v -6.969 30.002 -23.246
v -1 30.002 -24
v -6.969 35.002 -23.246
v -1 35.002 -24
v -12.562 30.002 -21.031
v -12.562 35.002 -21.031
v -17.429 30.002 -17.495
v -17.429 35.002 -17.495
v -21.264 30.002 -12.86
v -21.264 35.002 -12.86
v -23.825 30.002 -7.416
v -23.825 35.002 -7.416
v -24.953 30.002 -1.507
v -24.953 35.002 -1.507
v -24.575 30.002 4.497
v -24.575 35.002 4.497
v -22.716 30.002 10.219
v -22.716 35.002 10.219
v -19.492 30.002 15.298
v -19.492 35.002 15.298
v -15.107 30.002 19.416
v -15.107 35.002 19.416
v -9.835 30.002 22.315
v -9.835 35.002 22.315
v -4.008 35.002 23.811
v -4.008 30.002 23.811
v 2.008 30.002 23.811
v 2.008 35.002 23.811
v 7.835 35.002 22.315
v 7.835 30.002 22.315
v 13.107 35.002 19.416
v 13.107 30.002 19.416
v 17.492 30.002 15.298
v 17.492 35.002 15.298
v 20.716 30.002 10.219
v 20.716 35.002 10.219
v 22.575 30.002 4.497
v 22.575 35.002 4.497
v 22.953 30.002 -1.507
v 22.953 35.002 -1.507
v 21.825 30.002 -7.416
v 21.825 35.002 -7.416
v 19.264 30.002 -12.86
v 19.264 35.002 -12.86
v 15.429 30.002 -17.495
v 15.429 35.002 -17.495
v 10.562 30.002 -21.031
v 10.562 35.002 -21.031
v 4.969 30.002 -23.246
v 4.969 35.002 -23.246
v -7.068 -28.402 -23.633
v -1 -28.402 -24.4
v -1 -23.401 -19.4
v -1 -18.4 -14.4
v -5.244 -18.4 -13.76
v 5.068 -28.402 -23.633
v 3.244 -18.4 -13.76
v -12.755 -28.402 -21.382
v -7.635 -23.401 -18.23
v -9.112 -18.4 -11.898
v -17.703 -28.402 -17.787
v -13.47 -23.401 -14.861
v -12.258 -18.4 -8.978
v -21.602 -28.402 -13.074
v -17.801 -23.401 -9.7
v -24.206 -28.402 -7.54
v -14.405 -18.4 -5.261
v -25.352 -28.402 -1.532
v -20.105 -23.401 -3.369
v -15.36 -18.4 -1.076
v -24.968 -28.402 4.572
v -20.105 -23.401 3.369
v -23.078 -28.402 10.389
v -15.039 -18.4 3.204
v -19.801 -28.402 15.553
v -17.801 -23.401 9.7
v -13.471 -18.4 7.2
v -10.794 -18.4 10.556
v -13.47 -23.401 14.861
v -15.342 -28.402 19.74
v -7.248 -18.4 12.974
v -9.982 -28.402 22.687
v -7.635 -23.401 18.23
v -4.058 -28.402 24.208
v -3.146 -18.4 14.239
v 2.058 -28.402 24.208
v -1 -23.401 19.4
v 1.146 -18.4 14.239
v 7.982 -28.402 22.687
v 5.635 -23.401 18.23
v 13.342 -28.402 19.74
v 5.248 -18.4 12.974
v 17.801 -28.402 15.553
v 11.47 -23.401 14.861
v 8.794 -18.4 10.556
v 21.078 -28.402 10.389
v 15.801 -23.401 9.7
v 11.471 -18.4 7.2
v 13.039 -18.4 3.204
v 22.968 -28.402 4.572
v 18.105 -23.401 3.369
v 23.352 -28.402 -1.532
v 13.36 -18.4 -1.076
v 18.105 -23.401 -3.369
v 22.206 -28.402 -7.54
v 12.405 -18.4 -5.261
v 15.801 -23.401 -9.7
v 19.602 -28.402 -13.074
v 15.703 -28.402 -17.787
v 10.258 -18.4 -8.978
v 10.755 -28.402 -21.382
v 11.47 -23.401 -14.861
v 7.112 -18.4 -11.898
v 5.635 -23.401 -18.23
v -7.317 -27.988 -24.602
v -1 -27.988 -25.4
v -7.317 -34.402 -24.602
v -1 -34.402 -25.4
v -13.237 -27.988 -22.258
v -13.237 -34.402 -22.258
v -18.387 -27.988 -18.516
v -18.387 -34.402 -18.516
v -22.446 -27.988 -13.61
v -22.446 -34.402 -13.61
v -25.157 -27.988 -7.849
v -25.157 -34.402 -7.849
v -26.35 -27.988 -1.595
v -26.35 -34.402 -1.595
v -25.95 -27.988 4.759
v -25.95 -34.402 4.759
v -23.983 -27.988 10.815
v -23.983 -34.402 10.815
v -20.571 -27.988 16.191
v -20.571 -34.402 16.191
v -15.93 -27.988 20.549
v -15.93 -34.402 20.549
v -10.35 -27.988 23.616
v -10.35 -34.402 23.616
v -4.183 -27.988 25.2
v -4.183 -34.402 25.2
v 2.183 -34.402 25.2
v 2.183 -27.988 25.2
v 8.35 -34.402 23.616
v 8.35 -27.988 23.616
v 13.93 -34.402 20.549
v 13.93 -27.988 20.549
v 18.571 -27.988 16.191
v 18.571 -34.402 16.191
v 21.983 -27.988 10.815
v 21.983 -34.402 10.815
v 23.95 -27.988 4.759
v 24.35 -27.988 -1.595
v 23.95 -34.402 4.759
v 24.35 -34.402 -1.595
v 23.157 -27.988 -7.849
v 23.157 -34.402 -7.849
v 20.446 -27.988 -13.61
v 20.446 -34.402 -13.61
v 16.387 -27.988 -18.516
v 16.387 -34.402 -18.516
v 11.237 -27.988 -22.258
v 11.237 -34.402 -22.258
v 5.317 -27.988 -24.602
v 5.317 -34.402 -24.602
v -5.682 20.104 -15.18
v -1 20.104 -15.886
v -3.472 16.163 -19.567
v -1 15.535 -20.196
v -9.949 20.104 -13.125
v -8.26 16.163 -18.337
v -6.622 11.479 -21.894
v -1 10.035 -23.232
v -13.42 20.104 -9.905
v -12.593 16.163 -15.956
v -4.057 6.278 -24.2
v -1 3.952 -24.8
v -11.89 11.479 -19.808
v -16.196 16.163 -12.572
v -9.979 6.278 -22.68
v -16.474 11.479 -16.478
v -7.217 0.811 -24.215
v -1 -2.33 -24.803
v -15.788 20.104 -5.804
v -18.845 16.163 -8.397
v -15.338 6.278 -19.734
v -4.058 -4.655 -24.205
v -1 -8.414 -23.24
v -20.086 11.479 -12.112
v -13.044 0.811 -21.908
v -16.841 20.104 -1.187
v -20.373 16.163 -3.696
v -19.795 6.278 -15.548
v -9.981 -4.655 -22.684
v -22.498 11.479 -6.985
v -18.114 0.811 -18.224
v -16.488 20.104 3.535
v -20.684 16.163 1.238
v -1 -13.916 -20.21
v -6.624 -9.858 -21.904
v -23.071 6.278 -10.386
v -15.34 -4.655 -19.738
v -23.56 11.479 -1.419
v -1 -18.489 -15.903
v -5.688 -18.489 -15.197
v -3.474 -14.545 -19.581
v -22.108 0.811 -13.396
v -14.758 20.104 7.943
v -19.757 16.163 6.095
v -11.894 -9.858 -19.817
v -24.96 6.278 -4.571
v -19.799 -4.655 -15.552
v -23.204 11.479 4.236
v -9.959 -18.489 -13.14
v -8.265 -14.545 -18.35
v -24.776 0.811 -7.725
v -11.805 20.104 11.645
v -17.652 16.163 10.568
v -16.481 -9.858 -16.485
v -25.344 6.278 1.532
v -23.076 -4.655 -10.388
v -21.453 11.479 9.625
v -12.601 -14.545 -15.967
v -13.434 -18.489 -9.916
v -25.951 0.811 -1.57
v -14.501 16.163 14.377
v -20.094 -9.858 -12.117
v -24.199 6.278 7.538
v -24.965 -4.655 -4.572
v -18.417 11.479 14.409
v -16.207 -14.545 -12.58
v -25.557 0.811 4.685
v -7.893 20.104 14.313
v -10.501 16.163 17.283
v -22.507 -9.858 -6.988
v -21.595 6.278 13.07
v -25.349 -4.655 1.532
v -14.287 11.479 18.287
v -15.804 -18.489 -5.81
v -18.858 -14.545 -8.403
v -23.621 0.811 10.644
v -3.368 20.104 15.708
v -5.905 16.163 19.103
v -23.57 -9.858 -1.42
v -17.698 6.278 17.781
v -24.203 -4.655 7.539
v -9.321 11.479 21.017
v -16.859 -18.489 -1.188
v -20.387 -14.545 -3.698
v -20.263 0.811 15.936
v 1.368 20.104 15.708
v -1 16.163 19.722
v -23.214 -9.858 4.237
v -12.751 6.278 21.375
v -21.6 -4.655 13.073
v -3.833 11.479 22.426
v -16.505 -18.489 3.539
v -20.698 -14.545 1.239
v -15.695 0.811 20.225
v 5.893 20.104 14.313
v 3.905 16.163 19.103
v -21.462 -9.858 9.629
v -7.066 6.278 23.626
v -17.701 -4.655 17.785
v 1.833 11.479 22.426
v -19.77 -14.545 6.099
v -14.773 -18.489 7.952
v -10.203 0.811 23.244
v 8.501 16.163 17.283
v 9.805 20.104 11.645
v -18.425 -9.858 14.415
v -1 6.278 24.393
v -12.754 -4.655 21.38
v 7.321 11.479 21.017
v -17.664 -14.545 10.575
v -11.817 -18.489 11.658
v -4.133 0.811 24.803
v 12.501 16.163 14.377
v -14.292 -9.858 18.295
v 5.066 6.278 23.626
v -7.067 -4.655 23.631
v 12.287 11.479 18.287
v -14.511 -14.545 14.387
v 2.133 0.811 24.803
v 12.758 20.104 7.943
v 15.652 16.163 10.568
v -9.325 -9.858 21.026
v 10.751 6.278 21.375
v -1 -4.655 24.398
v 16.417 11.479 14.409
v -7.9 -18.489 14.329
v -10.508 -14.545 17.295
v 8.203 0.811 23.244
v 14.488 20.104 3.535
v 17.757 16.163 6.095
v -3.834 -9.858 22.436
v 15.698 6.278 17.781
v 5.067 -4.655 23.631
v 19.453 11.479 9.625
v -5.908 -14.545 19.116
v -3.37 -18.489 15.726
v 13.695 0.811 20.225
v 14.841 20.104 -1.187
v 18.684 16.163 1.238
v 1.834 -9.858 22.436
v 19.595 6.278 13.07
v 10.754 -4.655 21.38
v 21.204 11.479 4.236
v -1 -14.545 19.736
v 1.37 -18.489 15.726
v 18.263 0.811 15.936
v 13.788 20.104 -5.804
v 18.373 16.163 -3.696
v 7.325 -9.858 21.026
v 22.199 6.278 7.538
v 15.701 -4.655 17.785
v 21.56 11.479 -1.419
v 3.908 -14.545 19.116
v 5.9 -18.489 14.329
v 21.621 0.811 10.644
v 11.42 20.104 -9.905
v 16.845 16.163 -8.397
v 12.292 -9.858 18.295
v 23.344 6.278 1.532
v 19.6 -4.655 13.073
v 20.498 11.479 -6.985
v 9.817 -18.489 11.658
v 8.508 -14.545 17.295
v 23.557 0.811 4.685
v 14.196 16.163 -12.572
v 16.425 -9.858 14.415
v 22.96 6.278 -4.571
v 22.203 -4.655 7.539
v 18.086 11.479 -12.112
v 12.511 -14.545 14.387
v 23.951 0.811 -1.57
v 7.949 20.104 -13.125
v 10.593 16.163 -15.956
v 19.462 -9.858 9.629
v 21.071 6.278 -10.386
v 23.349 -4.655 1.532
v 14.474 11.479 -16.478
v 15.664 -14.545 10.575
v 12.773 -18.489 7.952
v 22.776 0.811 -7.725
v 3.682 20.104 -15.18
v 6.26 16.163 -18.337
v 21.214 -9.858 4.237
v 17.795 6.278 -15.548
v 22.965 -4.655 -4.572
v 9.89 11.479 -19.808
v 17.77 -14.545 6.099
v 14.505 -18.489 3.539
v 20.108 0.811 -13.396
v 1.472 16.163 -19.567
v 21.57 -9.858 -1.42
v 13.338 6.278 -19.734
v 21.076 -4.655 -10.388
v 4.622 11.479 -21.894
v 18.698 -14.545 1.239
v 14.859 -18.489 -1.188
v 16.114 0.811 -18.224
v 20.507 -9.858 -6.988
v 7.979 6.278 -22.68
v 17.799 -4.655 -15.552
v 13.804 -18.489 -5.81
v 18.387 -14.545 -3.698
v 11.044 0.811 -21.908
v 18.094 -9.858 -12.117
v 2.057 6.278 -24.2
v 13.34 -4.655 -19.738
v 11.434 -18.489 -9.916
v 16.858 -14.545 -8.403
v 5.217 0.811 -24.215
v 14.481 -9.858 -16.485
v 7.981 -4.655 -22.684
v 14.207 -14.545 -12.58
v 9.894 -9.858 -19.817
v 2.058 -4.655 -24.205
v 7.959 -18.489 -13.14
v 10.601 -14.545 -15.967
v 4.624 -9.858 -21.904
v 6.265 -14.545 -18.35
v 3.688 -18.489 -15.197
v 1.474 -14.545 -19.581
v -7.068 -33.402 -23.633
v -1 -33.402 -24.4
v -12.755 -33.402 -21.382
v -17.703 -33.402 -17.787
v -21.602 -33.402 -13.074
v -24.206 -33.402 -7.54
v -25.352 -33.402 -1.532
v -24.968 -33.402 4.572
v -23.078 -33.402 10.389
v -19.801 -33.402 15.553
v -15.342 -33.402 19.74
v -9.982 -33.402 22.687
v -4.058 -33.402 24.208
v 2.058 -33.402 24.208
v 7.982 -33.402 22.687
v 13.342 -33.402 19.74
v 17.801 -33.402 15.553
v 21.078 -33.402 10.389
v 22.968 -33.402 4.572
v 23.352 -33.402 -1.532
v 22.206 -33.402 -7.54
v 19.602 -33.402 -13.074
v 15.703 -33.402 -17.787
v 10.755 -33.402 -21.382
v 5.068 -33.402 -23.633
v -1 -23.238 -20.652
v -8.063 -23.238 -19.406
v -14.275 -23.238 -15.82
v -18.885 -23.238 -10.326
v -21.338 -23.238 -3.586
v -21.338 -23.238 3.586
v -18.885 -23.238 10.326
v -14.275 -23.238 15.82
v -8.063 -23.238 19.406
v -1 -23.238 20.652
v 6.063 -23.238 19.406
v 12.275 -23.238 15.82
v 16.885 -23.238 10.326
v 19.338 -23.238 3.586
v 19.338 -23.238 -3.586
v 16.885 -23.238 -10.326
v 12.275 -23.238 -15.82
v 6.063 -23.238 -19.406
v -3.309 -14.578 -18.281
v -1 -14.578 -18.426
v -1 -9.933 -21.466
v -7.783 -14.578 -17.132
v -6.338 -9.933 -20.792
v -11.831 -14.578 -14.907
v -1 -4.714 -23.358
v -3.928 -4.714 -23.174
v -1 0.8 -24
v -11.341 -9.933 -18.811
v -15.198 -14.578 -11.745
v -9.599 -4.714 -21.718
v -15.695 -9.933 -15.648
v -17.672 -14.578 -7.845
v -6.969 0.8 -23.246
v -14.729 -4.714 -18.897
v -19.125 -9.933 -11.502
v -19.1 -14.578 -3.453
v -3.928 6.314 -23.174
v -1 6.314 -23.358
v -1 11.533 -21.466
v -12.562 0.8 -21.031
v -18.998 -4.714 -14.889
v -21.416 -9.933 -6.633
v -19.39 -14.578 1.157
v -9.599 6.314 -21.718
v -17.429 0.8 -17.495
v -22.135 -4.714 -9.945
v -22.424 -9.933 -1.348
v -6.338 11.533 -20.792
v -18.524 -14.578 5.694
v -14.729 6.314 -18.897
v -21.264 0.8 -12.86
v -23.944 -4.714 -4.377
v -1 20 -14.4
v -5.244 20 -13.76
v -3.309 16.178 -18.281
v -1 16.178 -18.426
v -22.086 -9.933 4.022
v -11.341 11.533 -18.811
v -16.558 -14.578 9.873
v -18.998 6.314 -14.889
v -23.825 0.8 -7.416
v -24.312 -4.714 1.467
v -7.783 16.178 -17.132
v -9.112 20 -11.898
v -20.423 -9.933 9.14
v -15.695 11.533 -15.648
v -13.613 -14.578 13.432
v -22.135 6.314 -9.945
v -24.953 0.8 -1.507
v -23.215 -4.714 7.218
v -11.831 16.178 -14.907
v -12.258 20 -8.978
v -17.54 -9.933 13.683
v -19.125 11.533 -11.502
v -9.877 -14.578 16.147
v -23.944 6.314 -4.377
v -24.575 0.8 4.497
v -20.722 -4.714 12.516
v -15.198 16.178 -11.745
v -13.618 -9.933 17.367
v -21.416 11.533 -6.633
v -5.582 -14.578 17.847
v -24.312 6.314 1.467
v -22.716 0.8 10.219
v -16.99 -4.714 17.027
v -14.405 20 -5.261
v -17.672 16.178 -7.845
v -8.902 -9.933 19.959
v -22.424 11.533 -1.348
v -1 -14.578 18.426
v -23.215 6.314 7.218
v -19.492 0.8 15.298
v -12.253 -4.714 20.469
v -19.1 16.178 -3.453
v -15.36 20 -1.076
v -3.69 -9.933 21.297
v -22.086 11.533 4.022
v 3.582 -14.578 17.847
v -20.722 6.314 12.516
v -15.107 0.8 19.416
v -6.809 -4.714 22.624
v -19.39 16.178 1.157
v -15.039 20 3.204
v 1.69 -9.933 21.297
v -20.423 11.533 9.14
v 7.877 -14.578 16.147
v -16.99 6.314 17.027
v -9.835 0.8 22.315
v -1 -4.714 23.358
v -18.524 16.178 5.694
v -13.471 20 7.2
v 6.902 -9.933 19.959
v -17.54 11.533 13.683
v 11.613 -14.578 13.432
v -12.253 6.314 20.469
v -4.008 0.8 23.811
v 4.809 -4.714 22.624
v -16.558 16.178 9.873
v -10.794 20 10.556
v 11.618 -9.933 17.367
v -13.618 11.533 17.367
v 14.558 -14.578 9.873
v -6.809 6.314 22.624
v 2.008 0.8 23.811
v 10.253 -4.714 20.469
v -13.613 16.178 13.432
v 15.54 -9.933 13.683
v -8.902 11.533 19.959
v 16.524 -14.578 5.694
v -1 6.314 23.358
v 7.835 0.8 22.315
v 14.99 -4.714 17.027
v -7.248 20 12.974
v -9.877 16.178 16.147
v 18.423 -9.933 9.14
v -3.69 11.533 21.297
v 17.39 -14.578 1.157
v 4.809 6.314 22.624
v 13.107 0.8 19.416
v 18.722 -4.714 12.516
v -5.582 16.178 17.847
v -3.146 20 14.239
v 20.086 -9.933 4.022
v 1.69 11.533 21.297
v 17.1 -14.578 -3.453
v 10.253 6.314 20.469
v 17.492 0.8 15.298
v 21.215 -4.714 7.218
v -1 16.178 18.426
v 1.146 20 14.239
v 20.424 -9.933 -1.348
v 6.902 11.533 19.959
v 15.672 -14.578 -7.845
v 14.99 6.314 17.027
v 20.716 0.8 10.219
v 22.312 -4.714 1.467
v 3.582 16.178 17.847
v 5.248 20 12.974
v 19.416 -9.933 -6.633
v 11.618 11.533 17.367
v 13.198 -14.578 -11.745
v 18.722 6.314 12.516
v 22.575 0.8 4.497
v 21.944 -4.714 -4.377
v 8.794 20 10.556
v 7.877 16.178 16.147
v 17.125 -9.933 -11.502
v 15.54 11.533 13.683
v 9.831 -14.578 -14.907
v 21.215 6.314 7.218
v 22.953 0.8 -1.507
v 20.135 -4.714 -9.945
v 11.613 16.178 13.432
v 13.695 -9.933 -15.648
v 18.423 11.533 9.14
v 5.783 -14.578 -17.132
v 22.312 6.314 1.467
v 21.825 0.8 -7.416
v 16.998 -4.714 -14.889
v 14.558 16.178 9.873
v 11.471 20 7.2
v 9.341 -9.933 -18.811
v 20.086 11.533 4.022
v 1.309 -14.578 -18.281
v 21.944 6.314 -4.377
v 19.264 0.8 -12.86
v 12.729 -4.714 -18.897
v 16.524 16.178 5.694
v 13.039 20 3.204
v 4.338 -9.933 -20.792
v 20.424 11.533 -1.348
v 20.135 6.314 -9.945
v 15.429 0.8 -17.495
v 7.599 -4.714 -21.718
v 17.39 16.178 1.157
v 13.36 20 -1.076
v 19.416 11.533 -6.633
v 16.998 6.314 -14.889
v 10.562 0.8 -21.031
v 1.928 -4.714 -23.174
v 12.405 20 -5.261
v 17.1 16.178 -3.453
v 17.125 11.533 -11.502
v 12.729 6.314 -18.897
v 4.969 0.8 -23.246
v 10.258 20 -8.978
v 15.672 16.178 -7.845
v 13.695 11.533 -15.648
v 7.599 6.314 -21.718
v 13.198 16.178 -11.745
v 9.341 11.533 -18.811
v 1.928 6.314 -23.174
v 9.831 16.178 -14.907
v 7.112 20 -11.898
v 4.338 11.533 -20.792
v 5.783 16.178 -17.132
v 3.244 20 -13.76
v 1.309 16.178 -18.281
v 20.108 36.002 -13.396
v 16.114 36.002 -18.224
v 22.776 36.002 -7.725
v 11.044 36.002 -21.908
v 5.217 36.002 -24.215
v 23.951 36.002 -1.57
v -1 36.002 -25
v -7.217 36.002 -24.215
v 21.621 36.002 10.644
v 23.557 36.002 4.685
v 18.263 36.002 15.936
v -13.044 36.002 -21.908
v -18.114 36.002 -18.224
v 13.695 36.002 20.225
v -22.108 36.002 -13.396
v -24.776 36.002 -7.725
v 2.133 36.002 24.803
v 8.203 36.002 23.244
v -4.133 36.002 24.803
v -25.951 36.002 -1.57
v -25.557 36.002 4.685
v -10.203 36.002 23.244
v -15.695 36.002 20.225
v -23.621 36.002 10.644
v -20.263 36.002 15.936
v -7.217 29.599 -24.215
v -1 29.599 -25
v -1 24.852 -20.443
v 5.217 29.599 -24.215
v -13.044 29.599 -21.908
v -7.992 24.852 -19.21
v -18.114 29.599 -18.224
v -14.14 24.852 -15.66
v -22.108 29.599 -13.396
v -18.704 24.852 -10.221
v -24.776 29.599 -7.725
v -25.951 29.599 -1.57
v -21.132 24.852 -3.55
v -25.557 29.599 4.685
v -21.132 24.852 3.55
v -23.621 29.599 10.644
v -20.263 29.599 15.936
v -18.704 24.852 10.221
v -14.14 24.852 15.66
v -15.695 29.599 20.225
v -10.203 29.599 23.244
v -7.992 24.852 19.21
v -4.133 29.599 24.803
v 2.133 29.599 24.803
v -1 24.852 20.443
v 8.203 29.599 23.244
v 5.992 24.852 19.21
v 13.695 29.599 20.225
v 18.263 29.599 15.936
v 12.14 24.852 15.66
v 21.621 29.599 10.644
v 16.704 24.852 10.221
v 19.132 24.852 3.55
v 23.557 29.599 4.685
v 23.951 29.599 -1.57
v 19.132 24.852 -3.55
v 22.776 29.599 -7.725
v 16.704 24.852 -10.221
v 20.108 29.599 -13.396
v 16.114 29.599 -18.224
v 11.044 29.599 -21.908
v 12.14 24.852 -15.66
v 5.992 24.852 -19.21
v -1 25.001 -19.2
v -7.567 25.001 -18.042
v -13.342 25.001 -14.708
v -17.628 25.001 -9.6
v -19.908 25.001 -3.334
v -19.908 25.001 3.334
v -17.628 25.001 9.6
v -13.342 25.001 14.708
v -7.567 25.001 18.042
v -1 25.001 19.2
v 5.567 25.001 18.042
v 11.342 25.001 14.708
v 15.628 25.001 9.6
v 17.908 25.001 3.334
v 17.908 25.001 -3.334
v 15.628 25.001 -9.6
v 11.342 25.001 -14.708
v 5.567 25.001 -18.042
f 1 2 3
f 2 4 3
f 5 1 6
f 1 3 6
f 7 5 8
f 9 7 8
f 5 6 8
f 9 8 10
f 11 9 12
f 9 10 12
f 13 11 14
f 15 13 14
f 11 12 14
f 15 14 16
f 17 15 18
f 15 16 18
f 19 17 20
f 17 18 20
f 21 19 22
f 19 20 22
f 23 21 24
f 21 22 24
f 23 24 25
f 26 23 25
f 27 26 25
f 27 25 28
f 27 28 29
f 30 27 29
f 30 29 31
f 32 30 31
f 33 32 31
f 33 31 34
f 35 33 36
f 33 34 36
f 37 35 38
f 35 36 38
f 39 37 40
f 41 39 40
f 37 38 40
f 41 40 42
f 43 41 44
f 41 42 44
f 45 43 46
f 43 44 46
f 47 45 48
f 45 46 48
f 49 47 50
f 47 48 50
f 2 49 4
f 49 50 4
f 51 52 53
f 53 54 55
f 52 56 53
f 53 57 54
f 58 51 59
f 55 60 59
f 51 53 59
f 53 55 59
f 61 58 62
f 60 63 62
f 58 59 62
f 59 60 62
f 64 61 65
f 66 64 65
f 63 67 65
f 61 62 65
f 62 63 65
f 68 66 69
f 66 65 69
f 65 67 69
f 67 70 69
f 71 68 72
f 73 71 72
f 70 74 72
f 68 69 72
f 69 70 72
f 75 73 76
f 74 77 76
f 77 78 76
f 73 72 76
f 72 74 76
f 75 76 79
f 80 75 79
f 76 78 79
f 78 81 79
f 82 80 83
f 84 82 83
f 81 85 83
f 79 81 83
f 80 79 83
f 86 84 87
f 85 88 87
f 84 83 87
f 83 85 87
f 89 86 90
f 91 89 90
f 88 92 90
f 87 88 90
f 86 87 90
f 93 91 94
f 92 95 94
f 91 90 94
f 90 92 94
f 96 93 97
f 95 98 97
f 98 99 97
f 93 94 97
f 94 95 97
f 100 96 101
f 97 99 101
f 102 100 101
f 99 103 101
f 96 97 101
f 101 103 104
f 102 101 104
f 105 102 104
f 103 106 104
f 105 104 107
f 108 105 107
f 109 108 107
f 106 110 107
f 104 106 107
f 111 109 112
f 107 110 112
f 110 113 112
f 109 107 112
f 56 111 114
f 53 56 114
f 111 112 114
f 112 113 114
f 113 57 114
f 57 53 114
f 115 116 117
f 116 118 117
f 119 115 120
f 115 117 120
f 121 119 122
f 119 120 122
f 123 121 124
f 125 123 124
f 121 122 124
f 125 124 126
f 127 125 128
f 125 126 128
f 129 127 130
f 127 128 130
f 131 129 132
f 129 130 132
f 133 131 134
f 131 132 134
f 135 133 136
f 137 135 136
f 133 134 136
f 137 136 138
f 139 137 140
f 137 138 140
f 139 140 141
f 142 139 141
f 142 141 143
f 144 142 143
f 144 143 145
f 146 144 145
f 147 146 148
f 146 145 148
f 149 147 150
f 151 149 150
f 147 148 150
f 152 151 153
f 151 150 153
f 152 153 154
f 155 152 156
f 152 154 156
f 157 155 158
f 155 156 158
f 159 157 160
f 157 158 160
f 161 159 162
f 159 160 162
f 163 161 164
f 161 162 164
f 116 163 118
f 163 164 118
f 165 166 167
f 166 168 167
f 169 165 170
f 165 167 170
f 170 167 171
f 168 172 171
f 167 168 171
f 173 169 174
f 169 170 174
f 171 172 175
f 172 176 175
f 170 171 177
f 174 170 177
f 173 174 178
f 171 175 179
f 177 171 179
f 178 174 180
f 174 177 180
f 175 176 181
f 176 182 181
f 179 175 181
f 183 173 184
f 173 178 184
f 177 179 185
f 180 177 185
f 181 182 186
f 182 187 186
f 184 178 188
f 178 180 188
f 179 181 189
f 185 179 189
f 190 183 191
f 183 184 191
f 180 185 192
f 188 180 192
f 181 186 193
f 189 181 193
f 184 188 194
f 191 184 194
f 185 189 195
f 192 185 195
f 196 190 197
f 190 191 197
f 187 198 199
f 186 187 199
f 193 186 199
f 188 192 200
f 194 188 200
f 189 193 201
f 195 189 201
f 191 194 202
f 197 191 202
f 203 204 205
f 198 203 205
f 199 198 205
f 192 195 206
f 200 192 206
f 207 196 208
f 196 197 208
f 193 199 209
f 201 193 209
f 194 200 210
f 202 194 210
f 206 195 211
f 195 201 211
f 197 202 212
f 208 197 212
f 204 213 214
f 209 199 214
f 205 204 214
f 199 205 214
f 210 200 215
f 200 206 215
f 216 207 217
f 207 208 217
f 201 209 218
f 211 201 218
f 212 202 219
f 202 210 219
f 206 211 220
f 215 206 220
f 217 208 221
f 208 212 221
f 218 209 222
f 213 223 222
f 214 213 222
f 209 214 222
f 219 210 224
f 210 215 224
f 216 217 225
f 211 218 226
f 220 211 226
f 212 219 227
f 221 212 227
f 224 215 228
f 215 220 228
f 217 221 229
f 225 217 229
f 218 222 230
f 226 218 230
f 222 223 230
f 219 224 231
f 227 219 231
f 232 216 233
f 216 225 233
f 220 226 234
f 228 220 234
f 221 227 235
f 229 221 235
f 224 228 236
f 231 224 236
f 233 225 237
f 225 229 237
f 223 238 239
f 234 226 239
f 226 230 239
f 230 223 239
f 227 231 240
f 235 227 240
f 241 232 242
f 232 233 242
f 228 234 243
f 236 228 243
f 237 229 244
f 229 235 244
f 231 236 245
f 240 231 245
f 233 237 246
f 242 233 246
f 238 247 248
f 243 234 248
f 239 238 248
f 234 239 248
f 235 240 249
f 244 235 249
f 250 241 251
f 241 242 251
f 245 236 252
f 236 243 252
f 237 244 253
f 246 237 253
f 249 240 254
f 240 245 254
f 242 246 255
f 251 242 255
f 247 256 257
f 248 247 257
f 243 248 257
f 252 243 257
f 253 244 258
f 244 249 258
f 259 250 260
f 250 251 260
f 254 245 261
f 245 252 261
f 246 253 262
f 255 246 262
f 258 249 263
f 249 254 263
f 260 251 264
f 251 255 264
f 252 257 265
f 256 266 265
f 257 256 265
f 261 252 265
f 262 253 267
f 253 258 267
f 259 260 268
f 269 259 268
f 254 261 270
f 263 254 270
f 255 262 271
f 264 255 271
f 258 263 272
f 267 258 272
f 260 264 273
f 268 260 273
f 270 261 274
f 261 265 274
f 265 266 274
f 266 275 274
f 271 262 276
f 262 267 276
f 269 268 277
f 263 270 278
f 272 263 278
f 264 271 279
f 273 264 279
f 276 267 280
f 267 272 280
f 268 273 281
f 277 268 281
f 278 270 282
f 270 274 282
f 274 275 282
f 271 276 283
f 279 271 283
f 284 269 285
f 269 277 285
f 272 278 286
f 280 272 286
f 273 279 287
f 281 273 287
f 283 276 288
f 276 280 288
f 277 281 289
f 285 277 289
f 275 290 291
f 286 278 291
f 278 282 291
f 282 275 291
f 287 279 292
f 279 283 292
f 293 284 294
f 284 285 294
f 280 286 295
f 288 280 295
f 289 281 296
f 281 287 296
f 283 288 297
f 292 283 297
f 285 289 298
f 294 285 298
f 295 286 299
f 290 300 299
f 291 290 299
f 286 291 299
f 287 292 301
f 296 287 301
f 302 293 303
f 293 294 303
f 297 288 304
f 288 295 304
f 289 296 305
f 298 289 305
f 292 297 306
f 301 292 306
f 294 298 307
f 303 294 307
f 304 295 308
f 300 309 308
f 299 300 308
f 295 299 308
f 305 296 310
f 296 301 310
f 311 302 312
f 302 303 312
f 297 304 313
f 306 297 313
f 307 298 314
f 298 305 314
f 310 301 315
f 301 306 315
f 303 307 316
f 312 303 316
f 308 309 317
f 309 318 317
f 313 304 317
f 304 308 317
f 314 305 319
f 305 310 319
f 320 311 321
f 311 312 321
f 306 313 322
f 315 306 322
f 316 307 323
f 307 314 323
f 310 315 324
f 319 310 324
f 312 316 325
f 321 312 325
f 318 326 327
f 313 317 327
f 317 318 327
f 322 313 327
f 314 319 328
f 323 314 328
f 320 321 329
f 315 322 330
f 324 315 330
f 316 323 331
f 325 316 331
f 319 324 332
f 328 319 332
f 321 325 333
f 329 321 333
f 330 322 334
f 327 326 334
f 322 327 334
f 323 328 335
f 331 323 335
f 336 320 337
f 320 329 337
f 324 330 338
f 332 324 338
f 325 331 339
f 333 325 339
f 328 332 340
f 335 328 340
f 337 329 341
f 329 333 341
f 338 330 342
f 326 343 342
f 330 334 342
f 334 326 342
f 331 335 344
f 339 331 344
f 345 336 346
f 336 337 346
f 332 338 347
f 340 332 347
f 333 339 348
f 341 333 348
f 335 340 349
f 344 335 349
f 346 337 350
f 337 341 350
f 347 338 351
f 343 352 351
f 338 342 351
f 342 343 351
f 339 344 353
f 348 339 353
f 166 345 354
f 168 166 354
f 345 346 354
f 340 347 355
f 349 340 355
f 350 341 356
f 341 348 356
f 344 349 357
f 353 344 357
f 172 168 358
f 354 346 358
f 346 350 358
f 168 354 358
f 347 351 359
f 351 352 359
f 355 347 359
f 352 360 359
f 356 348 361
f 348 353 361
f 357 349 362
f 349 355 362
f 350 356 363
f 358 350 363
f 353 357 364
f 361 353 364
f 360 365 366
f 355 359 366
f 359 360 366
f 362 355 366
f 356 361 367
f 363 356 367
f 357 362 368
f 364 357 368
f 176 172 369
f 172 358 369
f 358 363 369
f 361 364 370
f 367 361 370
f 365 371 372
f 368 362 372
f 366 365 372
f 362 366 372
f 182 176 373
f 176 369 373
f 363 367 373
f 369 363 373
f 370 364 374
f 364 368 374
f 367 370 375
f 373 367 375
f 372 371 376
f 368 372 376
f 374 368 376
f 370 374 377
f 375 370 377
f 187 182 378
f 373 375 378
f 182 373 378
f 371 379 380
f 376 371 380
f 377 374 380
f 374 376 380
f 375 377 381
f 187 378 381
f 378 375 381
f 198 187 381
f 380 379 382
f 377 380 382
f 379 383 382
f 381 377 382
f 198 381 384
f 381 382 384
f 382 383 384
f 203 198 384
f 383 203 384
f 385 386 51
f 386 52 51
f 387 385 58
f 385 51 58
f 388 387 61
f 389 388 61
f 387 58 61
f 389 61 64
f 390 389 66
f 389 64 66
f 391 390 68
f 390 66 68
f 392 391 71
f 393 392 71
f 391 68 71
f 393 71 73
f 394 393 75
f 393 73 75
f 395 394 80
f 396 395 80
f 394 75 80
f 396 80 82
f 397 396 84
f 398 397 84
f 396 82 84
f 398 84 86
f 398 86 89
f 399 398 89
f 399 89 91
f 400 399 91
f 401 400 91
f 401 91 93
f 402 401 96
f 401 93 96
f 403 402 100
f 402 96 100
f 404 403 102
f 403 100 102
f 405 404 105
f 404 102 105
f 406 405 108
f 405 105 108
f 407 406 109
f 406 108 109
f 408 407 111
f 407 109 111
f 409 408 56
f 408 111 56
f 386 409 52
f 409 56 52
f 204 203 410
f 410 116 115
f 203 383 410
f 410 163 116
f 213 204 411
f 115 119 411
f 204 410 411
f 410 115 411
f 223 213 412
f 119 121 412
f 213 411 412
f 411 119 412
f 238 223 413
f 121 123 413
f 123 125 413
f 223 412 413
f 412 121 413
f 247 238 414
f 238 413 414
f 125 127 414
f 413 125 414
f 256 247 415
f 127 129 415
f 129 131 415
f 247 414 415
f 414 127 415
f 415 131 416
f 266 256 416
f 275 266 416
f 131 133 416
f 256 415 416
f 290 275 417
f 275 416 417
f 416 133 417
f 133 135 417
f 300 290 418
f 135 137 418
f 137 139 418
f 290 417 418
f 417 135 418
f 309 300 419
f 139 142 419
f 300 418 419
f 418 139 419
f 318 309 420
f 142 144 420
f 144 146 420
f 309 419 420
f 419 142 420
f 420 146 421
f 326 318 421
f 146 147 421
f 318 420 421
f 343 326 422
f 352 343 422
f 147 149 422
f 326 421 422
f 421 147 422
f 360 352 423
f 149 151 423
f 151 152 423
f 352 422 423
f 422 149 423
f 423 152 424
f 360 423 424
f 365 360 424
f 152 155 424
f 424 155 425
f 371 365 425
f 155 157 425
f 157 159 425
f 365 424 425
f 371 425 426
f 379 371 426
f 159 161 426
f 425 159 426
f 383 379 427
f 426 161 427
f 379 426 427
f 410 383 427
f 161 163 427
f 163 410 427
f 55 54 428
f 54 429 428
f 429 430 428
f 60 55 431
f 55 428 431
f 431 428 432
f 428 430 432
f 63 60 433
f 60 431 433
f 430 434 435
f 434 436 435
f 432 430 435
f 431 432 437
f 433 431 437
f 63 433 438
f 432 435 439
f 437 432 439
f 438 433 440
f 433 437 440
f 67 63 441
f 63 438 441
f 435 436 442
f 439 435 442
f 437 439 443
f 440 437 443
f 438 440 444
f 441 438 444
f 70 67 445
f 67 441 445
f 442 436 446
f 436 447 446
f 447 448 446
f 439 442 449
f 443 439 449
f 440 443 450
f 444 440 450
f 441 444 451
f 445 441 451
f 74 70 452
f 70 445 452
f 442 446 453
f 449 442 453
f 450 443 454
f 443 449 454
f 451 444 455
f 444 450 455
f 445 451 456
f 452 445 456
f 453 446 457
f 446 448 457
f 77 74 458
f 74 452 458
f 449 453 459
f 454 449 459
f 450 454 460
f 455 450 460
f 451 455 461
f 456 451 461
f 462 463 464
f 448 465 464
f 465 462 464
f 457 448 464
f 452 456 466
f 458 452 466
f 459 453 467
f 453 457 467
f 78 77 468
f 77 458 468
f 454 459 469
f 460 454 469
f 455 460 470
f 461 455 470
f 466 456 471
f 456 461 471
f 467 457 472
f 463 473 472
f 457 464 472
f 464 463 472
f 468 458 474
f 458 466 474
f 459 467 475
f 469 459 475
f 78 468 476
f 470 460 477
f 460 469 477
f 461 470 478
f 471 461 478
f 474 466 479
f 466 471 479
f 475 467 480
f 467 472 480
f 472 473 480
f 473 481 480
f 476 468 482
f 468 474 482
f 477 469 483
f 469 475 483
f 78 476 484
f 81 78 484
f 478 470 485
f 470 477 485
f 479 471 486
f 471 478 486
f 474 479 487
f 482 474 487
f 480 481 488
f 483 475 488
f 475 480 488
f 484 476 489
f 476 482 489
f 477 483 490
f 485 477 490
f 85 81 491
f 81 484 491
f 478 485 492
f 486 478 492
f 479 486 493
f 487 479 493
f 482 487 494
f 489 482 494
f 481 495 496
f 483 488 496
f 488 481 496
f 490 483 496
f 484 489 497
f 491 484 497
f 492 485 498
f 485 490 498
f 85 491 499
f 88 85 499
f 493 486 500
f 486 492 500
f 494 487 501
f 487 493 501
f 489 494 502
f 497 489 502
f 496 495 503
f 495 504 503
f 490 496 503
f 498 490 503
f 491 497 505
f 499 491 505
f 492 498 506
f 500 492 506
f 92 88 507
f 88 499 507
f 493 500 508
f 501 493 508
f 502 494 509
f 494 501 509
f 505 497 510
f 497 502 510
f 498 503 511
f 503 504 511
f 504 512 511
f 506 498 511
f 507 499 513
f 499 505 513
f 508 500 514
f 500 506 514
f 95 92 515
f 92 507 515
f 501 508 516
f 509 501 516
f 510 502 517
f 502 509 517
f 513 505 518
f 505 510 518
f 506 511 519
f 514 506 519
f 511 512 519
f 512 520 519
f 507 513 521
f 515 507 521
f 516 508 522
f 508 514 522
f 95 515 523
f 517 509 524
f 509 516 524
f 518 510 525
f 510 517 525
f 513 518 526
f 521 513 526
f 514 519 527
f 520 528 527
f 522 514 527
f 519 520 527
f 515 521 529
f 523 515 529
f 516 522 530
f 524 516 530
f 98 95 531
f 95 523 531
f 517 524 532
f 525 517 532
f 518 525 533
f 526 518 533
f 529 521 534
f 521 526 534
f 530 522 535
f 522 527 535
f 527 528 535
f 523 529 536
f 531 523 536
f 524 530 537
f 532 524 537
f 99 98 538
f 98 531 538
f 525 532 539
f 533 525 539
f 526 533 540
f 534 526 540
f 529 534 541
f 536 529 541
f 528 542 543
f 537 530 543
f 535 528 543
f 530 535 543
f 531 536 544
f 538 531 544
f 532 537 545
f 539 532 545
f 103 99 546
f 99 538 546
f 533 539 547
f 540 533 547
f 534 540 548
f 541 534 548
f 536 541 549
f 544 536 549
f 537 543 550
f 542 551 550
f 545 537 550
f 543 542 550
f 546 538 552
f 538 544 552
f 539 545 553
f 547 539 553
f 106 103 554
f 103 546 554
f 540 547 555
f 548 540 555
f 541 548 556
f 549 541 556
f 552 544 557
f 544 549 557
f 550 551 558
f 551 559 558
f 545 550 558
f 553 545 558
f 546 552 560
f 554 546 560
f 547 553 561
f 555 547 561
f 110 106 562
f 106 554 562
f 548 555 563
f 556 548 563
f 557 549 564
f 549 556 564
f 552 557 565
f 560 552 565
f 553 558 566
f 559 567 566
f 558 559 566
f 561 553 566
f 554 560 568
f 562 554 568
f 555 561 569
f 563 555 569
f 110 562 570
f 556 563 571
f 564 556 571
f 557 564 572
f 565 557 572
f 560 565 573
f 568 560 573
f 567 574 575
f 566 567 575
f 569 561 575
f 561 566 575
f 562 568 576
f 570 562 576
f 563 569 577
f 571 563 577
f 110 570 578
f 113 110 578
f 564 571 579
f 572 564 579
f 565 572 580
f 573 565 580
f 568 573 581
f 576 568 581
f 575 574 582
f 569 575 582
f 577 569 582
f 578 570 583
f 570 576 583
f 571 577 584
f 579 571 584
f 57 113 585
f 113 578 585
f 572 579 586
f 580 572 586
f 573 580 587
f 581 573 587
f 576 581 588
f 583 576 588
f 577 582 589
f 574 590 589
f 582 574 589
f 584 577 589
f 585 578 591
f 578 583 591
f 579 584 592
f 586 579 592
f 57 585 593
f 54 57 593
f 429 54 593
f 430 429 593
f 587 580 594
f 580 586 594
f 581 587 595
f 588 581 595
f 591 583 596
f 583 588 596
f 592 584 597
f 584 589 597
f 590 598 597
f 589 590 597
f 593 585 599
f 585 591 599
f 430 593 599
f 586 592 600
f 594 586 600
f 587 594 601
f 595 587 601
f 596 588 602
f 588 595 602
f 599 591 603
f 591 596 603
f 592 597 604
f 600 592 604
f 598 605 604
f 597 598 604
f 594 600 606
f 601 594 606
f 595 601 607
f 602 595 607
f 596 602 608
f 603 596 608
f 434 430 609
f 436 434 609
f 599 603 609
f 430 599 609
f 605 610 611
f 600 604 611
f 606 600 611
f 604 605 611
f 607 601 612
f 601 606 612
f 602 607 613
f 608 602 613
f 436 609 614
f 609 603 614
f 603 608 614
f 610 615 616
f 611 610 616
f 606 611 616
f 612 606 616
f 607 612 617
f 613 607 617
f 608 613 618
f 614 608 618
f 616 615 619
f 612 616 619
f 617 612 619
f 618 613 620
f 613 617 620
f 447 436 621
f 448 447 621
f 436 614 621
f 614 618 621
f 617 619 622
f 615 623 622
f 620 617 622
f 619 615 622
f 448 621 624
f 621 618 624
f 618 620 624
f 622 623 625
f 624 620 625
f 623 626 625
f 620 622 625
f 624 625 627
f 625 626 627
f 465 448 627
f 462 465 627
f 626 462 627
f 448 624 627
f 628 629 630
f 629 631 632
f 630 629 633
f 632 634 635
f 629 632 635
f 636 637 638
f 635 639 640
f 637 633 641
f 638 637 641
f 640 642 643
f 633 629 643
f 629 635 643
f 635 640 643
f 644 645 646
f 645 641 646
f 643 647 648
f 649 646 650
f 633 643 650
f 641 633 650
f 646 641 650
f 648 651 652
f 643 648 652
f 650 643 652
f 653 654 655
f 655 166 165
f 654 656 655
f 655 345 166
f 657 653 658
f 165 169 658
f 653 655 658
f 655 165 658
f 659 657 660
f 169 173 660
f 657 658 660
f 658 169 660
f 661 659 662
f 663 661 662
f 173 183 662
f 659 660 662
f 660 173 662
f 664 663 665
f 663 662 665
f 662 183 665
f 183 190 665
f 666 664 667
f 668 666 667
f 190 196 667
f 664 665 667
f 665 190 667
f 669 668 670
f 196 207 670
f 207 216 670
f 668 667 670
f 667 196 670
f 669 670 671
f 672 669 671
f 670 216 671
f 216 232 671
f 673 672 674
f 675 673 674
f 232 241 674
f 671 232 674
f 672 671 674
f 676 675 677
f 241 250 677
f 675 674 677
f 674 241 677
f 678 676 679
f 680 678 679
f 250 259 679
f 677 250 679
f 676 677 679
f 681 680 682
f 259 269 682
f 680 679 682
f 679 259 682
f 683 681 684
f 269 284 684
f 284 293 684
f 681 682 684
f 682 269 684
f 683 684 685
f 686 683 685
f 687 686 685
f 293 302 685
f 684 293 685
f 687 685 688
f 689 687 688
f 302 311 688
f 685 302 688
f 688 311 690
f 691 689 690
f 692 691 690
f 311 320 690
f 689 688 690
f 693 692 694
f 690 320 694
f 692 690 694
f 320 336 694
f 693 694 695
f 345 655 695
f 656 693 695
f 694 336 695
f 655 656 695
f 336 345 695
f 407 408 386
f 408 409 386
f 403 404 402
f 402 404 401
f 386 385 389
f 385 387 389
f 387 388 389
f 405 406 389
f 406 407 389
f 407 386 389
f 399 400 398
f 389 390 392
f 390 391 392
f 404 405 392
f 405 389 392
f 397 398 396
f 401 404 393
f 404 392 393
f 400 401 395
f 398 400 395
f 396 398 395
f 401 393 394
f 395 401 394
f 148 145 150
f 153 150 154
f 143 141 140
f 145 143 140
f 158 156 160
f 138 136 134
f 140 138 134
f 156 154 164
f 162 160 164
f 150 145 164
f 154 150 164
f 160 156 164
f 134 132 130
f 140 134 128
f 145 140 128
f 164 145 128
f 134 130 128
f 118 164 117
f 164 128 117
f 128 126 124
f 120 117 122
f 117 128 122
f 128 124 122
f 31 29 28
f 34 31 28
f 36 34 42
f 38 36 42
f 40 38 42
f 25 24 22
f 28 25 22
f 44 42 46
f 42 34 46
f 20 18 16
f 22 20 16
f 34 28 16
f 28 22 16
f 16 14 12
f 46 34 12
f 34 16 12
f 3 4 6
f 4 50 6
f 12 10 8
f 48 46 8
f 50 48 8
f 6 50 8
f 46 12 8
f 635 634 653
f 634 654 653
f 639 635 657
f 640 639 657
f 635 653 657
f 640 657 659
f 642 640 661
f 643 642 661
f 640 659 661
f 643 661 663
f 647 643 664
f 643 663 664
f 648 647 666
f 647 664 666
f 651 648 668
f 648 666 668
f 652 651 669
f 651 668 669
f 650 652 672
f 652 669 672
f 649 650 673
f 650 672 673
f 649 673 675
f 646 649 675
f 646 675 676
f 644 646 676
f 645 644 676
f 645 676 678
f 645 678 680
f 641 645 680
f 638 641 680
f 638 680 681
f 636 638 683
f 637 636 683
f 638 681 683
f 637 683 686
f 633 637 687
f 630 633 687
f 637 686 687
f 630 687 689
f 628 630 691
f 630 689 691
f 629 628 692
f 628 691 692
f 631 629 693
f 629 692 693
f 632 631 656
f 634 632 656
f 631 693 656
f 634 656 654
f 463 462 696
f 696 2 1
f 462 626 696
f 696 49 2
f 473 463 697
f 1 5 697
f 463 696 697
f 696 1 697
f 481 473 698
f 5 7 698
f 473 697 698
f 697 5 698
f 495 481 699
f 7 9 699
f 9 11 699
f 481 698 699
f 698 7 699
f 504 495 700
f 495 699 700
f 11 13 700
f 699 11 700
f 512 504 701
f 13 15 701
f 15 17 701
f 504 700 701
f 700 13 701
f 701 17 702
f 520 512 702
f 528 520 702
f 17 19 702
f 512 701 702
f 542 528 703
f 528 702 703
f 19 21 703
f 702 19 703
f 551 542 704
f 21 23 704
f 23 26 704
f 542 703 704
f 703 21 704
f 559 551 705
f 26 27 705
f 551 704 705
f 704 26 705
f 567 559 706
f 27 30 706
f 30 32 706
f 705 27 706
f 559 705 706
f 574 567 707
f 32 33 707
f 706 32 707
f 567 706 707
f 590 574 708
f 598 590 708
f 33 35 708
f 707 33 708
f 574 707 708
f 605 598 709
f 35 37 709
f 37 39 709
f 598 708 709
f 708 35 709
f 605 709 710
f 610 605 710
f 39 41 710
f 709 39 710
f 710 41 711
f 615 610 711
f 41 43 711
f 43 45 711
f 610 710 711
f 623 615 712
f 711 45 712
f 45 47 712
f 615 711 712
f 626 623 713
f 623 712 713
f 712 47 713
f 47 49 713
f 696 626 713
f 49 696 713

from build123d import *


with BuildPart() as part:
    # 草图1 → 旋转-薄壁3 (revolve)
    with BuildSketch(Plane.XY, mode=Mode.PRIVATE) as revolve_3_sk:
        with BuildLine():
            Line((-1, -33.401673559), (-25.4, -33.401673559))
            Line((-25.4, -33.401673559), (-25.4, -28.401673559))
            Line((-25.4, -28.401673559), (-15.4, -18.4))
            ThreePointArc((-15.4, -18.4), (-25, 0.8), (-15.4, 20))
            Line((-15.4, 20), (-25, 30.001673559))
            Line((-25, 30.001673559), (-25, 35.001673559))
            Line((-25, 35.001673559), (-1, 35.001673559))
            Line((-1, 35.001673559), (-1, 36.001673559))
            Line((-1, 36.001673559), (-26, 36.001673559))
            Line((-26, 36.001673559), (-26, 29.599411836))
            Line((-26, 29.599411836), (-16.885830121, 20.103896015))
            ThreePointArc((-16.885830121, 20.103896015), (-25.999997392, 0.811418377), (-16.903457024, -18.489376731))
            Line((-16.903457024, -18.489376731), (-26.4, -27.987509009))
            Line((-26.4, -27.987509009), (-26.4, -34.401673559))
            Line((-26.4, -34.401673559), (-1, -34.401673559))
            Line((-1, -34.401673559), (-1, -33.401673559))
        make_face()
    revolve(revolve_3_sk.sketch.rotate(Axis((-1, -999.2, 0), (0, 1, 0)), 270), axis=Axis((-1, -999.2, 0), (0, 1, 0)))


solid = part.part
